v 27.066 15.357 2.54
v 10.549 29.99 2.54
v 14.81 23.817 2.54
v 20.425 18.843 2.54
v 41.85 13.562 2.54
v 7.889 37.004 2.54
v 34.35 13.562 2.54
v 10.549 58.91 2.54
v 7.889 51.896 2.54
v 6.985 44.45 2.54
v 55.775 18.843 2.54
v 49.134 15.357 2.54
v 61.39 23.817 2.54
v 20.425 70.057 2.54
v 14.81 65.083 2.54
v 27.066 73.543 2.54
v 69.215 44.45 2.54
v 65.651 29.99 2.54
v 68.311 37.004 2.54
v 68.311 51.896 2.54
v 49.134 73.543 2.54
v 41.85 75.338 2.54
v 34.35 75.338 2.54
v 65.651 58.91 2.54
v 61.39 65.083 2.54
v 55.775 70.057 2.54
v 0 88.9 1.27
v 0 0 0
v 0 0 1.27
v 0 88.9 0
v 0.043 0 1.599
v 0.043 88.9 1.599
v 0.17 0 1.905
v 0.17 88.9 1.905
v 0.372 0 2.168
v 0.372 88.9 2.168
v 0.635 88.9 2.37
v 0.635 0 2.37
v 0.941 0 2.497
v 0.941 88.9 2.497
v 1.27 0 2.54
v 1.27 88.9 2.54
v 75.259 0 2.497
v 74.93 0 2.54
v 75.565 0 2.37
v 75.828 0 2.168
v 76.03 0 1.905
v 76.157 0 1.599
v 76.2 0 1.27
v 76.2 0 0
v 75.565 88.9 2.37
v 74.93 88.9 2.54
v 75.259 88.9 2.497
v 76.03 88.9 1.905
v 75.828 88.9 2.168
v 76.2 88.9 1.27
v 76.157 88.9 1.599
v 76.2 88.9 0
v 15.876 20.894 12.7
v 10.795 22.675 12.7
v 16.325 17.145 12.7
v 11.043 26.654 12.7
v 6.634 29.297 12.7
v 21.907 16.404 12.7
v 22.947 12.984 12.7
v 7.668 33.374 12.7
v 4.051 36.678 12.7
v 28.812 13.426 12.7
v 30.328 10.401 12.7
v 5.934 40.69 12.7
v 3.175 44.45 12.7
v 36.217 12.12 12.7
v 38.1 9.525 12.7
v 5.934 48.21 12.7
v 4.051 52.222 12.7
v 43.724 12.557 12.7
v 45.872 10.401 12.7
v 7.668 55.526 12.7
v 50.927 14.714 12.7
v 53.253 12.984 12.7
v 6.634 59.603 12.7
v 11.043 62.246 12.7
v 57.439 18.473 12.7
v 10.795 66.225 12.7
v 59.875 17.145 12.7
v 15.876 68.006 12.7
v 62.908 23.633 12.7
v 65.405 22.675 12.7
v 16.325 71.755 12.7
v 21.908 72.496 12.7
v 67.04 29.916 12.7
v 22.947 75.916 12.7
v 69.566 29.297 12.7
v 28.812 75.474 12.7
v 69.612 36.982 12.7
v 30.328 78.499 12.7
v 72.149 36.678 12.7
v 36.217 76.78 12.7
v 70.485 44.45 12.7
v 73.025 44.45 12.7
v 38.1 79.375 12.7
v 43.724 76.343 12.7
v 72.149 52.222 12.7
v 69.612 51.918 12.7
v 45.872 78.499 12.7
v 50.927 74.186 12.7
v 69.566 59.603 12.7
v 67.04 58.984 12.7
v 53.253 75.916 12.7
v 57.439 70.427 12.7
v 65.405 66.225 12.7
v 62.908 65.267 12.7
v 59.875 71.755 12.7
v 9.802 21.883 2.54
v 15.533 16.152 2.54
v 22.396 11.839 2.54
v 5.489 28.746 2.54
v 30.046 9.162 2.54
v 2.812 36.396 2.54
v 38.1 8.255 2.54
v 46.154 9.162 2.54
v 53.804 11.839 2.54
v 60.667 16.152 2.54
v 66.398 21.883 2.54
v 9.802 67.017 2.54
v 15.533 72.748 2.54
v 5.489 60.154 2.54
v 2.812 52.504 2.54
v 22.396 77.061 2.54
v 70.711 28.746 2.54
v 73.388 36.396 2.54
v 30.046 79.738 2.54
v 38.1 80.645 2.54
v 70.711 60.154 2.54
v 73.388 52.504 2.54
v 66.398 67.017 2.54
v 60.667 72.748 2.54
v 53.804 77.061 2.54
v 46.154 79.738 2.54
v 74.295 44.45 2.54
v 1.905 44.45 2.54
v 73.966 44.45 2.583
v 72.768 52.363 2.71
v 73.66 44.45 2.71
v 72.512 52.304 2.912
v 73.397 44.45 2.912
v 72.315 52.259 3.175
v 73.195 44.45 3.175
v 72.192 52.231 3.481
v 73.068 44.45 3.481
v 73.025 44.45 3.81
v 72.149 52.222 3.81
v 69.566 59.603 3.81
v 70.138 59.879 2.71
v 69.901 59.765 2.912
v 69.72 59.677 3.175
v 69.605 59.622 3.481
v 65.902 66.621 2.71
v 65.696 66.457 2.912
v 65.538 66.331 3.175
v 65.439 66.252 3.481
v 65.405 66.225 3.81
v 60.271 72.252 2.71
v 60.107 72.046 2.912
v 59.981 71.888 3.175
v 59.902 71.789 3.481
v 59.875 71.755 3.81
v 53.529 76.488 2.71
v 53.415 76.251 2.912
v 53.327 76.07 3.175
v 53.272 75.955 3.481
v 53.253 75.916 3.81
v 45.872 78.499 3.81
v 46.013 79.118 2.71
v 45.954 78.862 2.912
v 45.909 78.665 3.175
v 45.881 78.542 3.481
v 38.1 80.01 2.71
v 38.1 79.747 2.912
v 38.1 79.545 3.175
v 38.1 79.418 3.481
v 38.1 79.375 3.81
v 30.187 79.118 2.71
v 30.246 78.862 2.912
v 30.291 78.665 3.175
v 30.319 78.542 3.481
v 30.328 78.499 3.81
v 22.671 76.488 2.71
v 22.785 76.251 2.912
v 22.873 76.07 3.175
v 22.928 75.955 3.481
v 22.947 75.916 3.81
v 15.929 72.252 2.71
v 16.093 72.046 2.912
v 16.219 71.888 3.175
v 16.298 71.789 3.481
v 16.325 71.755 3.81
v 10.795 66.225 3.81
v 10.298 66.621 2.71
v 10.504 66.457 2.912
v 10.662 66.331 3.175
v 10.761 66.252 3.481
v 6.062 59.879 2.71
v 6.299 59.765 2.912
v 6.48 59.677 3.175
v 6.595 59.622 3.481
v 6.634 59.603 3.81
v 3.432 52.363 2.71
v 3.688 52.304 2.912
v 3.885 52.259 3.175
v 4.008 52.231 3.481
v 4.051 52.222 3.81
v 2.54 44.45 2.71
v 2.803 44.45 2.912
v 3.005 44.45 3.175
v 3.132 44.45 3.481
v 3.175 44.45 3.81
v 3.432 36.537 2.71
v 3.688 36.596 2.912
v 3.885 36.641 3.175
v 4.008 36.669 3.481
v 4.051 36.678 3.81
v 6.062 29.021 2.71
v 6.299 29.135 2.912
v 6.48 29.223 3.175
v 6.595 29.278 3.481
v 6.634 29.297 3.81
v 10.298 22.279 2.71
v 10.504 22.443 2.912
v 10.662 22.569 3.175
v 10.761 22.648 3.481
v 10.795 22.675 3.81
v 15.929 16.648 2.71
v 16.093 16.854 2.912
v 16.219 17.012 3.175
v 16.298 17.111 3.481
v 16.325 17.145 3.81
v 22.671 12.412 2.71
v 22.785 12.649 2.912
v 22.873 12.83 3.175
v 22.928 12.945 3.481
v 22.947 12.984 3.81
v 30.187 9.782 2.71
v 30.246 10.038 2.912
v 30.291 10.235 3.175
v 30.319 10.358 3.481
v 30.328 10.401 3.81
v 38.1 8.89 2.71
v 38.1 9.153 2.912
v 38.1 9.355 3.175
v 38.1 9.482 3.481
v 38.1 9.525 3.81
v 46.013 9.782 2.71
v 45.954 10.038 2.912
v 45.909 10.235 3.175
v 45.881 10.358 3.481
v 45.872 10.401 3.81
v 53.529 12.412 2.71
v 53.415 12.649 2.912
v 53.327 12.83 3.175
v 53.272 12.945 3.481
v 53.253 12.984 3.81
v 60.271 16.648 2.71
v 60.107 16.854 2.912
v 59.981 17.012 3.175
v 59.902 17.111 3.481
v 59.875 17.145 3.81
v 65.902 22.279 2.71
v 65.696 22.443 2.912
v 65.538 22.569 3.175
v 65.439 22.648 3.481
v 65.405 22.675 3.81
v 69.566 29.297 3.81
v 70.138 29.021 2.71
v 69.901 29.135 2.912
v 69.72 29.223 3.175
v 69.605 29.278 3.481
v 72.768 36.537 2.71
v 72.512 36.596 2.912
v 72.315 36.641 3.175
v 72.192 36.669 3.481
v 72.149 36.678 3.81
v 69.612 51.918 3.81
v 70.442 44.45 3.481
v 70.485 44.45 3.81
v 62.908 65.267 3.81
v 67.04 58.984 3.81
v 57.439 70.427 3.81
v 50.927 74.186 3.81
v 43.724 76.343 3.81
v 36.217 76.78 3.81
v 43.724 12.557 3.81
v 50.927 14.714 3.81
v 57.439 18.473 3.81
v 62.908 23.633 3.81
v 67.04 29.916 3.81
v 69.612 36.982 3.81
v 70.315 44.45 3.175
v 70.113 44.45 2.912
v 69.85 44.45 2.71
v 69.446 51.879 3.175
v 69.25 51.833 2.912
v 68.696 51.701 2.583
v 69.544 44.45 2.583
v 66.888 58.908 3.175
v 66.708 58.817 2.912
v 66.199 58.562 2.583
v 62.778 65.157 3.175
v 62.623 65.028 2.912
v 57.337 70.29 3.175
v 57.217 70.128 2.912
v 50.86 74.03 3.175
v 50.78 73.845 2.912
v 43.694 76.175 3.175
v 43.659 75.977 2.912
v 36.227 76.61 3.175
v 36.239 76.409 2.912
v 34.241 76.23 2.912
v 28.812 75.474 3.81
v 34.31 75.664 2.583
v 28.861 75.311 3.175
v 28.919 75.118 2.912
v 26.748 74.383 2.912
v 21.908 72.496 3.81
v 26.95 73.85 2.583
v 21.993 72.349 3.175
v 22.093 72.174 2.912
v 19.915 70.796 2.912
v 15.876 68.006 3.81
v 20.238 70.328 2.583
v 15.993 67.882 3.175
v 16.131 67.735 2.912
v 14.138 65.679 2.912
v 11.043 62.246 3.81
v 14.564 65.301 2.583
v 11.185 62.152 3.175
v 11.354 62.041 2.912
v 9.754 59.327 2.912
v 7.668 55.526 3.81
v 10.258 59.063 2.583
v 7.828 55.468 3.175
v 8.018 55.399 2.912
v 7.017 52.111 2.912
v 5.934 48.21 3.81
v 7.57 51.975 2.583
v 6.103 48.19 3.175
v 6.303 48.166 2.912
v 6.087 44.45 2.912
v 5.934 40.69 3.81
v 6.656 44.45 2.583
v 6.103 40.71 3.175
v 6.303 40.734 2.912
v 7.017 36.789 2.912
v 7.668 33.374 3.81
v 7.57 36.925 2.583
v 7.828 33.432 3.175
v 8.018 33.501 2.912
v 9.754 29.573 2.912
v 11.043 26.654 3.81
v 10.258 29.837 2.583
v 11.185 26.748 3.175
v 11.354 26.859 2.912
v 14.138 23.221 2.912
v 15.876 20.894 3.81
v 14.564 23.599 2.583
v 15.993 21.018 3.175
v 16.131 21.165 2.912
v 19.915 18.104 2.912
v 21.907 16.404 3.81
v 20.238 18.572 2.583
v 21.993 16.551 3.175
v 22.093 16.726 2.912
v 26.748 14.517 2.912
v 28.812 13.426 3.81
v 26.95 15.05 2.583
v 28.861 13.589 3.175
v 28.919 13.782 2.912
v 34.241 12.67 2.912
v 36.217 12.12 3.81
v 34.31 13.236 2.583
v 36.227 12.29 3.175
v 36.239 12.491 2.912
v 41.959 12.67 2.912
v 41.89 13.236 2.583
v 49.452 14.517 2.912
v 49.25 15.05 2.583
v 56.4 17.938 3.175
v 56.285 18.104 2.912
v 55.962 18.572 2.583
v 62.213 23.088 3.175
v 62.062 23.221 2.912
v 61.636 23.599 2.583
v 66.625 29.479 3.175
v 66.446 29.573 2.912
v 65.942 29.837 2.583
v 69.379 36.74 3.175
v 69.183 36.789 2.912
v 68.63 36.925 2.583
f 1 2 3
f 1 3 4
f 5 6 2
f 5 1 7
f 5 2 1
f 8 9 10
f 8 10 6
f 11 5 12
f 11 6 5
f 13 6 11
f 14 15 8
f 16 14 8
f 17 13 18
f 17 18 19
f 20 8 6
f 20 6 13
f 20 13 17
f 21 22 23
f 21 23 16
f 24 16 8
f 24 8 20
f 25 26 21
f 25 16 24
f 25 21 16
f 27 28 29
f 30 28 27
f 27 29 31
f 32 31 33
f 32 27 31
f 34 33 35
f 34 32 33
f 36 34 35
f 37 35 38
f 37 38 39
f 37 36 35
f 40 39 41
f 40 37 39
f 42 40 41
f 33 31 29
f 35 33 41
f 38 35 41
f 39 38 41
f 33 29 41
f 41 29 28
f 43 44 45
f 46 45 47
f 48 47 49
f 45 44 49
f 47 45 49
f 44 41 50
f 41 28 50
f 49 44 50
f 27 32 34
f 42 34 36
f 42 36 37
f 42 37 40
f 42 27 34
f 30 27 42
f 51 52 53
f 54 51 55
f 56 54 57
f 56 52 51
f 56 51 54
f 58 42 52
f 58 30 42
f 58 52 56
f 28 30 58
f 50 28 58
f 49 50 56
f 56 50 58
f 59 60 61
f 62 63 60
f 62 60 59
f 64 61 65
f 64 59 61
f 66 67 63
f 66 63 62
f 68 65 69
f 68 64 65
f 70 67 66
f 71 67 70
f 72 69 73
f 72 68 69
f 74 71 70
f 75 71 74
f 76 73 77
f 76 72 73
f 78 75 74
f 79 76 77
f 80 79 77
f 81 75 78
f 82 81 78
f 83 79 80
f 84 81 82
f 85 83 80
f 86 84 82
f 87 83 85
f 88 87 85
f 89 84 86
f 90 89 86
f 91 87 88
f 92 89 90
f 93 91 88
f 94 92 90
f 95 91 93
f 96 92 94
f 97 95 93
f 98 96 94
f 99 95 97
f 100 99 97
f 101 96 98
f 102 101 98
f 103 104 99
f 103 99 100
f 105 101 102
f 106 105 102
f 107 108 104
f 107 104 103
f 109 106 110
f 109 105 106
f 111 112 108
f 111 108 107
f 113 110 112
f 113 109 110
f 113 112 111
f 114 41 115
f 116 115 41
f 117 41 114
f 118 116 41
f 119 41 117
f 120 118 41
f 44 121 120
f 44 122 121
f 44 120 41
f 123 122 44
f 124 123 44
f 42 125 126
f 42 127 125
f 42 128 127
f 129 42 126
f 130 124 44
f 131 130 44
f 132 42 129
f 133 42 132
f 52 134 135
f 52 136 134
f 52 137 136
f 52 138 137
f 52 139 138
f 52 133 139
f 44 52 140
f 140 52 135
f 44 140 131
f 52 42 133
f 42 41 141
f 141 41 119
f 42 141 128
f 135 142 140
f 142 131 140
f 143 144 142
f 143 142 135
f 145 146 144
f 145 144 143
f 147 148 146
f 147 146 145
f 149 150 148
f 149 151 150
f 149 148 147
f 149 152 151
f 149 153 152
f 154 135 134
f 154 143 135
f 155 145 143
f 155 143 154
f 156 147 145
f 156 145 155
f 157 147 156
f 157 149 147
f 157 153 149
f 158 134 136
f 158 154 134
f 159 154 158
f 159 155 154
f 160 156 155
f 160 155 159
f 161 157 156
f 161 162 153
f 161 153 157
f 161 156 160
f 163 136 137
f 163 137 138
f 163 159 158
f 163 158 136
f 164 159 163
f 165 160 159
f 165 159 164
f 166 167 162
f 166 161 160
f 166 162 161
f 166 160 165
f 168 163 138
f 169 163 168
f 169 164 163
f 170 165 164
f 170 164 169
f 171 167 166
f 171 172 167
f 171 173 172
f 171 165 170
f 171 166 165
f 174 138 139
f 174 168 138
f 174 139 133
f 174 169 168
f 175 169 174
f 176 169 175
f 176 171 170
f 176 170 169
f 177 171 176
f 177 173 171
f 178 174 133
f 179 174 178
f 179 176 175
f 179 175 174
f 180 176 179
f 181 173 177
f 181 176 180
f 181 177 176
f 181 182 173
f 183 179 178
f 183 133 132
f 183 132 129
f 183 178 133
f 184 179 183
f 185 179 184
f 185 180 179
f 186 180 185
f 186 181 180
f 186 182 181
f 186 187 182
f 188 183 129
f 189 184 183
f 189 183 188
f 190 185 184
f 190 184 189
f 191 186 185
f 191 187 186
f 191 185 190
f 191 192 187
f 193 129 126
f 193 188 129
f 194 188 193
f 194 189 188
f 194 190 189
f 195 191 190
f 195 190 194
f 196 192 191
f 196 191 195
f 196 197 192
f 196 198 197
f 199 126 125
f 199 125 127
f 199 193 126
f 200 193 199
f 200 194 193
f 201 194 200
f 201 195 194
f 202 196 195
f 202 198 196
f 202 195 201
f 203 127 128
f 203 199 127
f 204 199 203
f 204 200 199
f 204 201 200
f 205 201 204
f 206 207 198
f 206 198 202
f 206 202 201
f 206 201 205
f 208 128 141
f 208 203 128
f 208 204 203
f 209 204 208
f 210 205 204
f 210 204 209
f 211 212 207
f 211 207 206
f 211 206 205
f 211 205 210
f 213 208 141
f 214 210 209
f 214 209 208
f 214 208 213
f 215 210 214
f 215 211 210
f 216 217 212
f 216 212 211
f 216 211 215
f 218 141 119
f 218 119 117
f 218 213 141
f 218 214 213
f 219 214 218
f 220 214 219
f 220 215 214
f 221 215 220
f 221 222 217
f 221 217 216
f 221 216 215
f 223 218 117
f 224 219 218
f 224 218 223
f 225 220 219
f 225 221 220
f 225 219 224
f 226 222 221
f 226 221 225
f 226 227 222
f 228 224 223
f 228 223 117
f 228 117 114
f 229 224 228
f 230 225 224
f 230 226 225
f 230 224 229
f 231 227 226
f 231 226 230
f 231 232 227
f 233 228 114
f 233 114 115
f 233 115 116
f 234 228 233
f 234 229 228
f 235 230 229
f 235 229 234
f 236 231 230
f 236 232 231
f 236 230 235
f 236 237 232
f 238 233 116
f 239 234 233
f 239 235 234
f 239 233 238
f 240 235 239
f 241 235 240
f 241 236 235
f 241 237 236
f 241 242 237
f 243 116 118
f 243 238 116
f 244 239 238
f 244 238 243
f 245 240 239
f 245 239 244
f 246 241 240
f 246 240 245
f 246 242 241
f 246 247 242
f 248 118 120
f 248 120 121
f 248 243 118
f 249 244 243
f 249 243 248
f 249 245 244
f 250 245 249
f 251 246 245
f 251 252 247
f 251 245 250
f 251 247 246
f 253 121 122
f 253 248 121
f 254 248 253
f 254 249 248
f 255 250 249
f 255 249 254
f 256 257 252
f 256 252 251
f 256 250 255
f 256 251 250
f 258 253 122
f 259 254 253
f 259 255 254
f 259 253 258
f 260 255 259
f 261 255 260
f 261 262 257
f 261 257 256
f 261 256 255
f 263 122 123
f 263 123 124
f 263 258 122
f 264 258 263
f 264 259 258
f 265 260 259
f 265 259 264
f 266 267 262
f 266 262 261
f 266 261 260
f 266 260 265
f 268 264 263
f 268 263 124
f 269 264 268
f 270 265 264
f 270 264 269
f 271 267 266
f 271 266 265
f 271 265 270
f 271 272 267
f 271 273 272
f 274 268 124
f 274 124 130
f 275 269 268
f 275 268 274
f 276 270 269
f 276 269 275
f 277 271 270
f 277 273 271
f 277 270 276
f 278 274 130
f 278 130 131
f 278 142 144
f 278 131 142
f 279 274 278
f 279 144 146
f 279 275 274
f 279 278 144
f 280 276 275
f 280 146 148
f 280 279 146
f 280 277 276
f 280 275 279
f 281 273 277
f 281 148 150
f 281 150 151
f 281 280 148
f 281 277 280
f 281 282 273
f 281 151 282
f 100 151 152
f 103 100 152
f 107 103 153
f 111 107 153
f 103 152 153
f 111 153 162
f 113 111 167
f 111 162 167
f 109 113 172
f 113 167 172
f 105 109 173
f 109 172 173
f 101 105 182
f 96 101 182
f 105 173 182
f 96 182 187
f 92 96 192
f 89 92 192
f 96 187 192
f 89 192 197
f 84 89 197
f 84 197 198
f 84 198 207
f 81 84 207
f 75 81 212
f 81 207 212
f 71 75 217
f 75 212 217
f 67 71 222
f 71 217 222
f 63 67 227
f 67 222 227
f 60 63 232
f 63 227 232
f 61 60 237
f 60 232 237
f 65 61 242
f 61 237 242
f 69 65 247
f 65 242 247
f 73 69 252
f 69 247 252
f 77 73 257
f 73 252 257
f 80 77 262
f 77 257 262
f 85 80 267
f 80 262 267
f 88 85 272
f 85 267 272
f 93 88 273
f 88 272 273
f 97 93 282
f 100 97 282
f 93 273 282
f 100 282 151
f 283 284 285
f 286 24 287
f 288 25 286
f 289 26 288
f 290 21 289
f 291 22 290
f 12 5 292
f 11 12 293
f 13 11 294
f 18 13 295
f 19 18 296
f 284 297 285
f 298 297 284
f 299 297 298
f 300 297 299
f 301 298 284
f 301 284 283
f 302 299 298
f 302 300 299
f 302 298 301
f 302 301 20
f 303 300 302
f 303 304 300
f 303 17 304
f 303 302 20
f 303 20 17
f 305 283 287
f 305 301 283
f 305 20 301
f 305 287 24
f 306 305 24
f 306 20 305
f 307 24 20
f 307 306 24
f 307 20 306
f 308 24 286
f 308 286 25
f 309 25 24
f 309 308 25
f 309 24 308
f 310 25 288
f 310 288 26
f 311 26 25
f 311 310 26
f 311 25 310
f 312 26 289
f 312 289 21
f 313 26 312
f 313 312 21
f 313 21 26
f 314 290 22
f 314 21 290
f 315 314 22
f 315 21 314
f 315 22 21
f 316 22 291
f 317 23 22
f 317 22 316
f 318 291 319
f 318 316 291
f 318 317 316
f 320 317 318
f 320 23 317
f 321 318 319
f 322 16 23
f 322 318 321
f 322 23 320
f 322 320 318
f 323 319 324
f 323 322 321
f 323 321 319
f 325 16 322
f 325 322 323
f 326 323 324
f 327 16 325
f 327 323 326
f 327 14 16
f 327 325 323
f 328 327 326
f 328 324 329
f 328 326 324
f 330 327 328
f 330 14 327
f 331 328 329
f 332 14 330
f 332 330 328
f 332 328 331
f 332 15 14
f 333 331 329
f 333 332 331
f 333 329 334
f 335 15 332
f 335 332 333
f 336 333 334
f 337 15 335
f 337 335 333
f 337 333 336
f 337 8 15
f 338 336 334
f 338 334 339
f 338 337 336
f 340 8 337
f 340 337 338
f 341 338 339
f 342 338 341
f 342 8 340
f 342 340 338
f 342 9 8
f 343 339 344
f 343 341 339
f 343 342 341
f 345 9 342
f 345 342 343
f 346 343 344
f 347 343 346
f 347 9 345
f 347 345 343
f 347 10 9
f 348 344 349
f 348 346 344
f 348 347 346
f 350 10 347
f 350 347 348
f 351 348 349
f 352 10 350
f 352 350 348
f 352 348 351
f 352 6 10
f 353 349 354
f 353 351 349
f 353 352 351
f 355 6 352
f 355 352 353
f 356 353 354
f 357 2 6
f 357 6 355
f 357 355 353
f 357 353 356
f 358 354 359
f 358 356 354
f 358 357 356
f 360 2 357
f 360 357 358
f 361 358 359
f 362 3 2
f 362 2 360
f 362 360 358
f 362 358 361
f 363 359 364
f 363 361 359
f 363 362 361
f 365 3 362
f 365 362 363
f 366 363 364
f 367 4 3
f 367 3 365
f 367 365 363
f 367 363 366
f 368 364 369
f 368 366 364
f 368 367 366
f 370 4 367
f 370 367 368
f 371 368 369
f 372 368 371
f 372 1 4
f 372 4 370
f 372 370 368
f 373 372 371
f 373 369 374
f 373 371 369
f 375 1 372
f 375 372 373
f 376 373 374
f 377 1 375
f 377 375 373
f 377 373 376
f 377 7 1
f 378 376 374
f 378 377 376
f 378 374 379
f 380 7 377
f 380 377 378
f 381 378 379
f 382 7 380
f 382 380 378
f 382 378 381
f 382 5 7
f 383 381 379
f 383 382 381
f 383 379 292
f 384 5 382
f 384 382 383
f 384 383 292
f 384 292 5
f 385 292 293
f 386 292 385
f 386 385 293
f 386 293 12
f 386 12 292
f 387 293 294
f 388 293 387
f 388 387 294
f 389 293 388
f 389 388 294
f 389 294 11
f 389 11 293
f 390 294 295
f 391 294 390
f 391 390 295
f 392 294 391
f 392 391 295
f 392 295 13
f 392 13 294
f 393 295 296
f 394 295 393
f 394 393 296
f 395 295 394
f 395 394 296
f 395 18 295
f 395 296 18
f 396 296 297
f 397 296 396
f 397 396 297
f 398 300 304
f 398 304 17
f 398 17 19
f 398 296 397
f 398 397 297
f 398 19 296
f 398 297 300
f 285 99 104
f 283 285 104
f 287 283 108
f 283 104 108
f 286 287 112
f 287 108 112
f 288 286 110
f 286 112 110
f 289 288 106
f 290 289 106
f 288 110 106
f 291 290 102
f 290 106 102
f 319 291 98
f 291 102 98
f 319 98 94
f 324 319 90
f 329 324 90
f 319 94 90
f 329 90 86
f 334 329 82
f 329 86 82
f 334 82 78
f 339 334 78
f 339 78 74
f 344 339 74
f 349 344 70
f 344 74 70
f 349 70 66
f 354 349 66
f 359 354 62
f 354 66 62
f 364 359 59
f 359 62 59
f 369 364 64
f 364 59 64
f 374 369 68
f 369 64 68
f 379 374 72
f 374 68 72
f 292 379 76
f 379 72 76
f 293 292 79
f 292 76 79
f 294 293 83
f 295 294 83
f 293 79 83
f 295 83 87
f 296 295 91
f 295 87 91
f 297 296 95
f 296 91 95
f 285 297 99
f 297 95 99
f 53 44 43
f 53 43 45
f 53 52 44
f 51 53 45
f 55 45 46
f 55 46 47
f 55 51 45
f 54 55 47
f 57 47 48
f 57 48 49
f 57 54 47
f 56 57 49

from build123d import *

# Parameters (mm, degrees)
F0_W     = 76.2
F0_H     = 88.9
F1_DEPTH = 2.54
F2_R     = 34.925
F3_DEPTH = 10.16
F4_R     = 32.385
F5_DEPTH = 10.16
F6_R     = 1.27


with BuildPart() as f1:
    # F0 (on Top) → F1 (new body)
    with BuildSketch(Plane.XY):
        with Locations((38.1, 44.45)):
            Rectangle(F0_W, F0_H)
    extrude(amount=F1_DEPTH)

    # F2 (on face) → F3 (join)
    with BuildSketch(Plane.XY.offset(2.54)):
        with Locations((38.1, 44.45)):
            Circle(F2_R)
    extrude(amount=F3_DEPTH)

    # F4 (on face) → F5 (cut)
    with BuildSketch(Plane.XY.offset(12.7)):
        with Locations((38.1, 44.45)):
            Circle(F4_R)
    extrude(amount=-F5_DEPTH, mode=Mode.SUBTRACT)

    # F6
    f6_edges = [f1.edges().sort_by_distance(p)[0] for p in [
        (5.715, 44.45, 2.54),
        (0, 44.45, 2.54),
        (76.2, 44.45, 2.54),
        (3.175, 44.45, 2.54),
    ]]
    fillet(f6_edges, radius=F6_R)


solid = f1.part
